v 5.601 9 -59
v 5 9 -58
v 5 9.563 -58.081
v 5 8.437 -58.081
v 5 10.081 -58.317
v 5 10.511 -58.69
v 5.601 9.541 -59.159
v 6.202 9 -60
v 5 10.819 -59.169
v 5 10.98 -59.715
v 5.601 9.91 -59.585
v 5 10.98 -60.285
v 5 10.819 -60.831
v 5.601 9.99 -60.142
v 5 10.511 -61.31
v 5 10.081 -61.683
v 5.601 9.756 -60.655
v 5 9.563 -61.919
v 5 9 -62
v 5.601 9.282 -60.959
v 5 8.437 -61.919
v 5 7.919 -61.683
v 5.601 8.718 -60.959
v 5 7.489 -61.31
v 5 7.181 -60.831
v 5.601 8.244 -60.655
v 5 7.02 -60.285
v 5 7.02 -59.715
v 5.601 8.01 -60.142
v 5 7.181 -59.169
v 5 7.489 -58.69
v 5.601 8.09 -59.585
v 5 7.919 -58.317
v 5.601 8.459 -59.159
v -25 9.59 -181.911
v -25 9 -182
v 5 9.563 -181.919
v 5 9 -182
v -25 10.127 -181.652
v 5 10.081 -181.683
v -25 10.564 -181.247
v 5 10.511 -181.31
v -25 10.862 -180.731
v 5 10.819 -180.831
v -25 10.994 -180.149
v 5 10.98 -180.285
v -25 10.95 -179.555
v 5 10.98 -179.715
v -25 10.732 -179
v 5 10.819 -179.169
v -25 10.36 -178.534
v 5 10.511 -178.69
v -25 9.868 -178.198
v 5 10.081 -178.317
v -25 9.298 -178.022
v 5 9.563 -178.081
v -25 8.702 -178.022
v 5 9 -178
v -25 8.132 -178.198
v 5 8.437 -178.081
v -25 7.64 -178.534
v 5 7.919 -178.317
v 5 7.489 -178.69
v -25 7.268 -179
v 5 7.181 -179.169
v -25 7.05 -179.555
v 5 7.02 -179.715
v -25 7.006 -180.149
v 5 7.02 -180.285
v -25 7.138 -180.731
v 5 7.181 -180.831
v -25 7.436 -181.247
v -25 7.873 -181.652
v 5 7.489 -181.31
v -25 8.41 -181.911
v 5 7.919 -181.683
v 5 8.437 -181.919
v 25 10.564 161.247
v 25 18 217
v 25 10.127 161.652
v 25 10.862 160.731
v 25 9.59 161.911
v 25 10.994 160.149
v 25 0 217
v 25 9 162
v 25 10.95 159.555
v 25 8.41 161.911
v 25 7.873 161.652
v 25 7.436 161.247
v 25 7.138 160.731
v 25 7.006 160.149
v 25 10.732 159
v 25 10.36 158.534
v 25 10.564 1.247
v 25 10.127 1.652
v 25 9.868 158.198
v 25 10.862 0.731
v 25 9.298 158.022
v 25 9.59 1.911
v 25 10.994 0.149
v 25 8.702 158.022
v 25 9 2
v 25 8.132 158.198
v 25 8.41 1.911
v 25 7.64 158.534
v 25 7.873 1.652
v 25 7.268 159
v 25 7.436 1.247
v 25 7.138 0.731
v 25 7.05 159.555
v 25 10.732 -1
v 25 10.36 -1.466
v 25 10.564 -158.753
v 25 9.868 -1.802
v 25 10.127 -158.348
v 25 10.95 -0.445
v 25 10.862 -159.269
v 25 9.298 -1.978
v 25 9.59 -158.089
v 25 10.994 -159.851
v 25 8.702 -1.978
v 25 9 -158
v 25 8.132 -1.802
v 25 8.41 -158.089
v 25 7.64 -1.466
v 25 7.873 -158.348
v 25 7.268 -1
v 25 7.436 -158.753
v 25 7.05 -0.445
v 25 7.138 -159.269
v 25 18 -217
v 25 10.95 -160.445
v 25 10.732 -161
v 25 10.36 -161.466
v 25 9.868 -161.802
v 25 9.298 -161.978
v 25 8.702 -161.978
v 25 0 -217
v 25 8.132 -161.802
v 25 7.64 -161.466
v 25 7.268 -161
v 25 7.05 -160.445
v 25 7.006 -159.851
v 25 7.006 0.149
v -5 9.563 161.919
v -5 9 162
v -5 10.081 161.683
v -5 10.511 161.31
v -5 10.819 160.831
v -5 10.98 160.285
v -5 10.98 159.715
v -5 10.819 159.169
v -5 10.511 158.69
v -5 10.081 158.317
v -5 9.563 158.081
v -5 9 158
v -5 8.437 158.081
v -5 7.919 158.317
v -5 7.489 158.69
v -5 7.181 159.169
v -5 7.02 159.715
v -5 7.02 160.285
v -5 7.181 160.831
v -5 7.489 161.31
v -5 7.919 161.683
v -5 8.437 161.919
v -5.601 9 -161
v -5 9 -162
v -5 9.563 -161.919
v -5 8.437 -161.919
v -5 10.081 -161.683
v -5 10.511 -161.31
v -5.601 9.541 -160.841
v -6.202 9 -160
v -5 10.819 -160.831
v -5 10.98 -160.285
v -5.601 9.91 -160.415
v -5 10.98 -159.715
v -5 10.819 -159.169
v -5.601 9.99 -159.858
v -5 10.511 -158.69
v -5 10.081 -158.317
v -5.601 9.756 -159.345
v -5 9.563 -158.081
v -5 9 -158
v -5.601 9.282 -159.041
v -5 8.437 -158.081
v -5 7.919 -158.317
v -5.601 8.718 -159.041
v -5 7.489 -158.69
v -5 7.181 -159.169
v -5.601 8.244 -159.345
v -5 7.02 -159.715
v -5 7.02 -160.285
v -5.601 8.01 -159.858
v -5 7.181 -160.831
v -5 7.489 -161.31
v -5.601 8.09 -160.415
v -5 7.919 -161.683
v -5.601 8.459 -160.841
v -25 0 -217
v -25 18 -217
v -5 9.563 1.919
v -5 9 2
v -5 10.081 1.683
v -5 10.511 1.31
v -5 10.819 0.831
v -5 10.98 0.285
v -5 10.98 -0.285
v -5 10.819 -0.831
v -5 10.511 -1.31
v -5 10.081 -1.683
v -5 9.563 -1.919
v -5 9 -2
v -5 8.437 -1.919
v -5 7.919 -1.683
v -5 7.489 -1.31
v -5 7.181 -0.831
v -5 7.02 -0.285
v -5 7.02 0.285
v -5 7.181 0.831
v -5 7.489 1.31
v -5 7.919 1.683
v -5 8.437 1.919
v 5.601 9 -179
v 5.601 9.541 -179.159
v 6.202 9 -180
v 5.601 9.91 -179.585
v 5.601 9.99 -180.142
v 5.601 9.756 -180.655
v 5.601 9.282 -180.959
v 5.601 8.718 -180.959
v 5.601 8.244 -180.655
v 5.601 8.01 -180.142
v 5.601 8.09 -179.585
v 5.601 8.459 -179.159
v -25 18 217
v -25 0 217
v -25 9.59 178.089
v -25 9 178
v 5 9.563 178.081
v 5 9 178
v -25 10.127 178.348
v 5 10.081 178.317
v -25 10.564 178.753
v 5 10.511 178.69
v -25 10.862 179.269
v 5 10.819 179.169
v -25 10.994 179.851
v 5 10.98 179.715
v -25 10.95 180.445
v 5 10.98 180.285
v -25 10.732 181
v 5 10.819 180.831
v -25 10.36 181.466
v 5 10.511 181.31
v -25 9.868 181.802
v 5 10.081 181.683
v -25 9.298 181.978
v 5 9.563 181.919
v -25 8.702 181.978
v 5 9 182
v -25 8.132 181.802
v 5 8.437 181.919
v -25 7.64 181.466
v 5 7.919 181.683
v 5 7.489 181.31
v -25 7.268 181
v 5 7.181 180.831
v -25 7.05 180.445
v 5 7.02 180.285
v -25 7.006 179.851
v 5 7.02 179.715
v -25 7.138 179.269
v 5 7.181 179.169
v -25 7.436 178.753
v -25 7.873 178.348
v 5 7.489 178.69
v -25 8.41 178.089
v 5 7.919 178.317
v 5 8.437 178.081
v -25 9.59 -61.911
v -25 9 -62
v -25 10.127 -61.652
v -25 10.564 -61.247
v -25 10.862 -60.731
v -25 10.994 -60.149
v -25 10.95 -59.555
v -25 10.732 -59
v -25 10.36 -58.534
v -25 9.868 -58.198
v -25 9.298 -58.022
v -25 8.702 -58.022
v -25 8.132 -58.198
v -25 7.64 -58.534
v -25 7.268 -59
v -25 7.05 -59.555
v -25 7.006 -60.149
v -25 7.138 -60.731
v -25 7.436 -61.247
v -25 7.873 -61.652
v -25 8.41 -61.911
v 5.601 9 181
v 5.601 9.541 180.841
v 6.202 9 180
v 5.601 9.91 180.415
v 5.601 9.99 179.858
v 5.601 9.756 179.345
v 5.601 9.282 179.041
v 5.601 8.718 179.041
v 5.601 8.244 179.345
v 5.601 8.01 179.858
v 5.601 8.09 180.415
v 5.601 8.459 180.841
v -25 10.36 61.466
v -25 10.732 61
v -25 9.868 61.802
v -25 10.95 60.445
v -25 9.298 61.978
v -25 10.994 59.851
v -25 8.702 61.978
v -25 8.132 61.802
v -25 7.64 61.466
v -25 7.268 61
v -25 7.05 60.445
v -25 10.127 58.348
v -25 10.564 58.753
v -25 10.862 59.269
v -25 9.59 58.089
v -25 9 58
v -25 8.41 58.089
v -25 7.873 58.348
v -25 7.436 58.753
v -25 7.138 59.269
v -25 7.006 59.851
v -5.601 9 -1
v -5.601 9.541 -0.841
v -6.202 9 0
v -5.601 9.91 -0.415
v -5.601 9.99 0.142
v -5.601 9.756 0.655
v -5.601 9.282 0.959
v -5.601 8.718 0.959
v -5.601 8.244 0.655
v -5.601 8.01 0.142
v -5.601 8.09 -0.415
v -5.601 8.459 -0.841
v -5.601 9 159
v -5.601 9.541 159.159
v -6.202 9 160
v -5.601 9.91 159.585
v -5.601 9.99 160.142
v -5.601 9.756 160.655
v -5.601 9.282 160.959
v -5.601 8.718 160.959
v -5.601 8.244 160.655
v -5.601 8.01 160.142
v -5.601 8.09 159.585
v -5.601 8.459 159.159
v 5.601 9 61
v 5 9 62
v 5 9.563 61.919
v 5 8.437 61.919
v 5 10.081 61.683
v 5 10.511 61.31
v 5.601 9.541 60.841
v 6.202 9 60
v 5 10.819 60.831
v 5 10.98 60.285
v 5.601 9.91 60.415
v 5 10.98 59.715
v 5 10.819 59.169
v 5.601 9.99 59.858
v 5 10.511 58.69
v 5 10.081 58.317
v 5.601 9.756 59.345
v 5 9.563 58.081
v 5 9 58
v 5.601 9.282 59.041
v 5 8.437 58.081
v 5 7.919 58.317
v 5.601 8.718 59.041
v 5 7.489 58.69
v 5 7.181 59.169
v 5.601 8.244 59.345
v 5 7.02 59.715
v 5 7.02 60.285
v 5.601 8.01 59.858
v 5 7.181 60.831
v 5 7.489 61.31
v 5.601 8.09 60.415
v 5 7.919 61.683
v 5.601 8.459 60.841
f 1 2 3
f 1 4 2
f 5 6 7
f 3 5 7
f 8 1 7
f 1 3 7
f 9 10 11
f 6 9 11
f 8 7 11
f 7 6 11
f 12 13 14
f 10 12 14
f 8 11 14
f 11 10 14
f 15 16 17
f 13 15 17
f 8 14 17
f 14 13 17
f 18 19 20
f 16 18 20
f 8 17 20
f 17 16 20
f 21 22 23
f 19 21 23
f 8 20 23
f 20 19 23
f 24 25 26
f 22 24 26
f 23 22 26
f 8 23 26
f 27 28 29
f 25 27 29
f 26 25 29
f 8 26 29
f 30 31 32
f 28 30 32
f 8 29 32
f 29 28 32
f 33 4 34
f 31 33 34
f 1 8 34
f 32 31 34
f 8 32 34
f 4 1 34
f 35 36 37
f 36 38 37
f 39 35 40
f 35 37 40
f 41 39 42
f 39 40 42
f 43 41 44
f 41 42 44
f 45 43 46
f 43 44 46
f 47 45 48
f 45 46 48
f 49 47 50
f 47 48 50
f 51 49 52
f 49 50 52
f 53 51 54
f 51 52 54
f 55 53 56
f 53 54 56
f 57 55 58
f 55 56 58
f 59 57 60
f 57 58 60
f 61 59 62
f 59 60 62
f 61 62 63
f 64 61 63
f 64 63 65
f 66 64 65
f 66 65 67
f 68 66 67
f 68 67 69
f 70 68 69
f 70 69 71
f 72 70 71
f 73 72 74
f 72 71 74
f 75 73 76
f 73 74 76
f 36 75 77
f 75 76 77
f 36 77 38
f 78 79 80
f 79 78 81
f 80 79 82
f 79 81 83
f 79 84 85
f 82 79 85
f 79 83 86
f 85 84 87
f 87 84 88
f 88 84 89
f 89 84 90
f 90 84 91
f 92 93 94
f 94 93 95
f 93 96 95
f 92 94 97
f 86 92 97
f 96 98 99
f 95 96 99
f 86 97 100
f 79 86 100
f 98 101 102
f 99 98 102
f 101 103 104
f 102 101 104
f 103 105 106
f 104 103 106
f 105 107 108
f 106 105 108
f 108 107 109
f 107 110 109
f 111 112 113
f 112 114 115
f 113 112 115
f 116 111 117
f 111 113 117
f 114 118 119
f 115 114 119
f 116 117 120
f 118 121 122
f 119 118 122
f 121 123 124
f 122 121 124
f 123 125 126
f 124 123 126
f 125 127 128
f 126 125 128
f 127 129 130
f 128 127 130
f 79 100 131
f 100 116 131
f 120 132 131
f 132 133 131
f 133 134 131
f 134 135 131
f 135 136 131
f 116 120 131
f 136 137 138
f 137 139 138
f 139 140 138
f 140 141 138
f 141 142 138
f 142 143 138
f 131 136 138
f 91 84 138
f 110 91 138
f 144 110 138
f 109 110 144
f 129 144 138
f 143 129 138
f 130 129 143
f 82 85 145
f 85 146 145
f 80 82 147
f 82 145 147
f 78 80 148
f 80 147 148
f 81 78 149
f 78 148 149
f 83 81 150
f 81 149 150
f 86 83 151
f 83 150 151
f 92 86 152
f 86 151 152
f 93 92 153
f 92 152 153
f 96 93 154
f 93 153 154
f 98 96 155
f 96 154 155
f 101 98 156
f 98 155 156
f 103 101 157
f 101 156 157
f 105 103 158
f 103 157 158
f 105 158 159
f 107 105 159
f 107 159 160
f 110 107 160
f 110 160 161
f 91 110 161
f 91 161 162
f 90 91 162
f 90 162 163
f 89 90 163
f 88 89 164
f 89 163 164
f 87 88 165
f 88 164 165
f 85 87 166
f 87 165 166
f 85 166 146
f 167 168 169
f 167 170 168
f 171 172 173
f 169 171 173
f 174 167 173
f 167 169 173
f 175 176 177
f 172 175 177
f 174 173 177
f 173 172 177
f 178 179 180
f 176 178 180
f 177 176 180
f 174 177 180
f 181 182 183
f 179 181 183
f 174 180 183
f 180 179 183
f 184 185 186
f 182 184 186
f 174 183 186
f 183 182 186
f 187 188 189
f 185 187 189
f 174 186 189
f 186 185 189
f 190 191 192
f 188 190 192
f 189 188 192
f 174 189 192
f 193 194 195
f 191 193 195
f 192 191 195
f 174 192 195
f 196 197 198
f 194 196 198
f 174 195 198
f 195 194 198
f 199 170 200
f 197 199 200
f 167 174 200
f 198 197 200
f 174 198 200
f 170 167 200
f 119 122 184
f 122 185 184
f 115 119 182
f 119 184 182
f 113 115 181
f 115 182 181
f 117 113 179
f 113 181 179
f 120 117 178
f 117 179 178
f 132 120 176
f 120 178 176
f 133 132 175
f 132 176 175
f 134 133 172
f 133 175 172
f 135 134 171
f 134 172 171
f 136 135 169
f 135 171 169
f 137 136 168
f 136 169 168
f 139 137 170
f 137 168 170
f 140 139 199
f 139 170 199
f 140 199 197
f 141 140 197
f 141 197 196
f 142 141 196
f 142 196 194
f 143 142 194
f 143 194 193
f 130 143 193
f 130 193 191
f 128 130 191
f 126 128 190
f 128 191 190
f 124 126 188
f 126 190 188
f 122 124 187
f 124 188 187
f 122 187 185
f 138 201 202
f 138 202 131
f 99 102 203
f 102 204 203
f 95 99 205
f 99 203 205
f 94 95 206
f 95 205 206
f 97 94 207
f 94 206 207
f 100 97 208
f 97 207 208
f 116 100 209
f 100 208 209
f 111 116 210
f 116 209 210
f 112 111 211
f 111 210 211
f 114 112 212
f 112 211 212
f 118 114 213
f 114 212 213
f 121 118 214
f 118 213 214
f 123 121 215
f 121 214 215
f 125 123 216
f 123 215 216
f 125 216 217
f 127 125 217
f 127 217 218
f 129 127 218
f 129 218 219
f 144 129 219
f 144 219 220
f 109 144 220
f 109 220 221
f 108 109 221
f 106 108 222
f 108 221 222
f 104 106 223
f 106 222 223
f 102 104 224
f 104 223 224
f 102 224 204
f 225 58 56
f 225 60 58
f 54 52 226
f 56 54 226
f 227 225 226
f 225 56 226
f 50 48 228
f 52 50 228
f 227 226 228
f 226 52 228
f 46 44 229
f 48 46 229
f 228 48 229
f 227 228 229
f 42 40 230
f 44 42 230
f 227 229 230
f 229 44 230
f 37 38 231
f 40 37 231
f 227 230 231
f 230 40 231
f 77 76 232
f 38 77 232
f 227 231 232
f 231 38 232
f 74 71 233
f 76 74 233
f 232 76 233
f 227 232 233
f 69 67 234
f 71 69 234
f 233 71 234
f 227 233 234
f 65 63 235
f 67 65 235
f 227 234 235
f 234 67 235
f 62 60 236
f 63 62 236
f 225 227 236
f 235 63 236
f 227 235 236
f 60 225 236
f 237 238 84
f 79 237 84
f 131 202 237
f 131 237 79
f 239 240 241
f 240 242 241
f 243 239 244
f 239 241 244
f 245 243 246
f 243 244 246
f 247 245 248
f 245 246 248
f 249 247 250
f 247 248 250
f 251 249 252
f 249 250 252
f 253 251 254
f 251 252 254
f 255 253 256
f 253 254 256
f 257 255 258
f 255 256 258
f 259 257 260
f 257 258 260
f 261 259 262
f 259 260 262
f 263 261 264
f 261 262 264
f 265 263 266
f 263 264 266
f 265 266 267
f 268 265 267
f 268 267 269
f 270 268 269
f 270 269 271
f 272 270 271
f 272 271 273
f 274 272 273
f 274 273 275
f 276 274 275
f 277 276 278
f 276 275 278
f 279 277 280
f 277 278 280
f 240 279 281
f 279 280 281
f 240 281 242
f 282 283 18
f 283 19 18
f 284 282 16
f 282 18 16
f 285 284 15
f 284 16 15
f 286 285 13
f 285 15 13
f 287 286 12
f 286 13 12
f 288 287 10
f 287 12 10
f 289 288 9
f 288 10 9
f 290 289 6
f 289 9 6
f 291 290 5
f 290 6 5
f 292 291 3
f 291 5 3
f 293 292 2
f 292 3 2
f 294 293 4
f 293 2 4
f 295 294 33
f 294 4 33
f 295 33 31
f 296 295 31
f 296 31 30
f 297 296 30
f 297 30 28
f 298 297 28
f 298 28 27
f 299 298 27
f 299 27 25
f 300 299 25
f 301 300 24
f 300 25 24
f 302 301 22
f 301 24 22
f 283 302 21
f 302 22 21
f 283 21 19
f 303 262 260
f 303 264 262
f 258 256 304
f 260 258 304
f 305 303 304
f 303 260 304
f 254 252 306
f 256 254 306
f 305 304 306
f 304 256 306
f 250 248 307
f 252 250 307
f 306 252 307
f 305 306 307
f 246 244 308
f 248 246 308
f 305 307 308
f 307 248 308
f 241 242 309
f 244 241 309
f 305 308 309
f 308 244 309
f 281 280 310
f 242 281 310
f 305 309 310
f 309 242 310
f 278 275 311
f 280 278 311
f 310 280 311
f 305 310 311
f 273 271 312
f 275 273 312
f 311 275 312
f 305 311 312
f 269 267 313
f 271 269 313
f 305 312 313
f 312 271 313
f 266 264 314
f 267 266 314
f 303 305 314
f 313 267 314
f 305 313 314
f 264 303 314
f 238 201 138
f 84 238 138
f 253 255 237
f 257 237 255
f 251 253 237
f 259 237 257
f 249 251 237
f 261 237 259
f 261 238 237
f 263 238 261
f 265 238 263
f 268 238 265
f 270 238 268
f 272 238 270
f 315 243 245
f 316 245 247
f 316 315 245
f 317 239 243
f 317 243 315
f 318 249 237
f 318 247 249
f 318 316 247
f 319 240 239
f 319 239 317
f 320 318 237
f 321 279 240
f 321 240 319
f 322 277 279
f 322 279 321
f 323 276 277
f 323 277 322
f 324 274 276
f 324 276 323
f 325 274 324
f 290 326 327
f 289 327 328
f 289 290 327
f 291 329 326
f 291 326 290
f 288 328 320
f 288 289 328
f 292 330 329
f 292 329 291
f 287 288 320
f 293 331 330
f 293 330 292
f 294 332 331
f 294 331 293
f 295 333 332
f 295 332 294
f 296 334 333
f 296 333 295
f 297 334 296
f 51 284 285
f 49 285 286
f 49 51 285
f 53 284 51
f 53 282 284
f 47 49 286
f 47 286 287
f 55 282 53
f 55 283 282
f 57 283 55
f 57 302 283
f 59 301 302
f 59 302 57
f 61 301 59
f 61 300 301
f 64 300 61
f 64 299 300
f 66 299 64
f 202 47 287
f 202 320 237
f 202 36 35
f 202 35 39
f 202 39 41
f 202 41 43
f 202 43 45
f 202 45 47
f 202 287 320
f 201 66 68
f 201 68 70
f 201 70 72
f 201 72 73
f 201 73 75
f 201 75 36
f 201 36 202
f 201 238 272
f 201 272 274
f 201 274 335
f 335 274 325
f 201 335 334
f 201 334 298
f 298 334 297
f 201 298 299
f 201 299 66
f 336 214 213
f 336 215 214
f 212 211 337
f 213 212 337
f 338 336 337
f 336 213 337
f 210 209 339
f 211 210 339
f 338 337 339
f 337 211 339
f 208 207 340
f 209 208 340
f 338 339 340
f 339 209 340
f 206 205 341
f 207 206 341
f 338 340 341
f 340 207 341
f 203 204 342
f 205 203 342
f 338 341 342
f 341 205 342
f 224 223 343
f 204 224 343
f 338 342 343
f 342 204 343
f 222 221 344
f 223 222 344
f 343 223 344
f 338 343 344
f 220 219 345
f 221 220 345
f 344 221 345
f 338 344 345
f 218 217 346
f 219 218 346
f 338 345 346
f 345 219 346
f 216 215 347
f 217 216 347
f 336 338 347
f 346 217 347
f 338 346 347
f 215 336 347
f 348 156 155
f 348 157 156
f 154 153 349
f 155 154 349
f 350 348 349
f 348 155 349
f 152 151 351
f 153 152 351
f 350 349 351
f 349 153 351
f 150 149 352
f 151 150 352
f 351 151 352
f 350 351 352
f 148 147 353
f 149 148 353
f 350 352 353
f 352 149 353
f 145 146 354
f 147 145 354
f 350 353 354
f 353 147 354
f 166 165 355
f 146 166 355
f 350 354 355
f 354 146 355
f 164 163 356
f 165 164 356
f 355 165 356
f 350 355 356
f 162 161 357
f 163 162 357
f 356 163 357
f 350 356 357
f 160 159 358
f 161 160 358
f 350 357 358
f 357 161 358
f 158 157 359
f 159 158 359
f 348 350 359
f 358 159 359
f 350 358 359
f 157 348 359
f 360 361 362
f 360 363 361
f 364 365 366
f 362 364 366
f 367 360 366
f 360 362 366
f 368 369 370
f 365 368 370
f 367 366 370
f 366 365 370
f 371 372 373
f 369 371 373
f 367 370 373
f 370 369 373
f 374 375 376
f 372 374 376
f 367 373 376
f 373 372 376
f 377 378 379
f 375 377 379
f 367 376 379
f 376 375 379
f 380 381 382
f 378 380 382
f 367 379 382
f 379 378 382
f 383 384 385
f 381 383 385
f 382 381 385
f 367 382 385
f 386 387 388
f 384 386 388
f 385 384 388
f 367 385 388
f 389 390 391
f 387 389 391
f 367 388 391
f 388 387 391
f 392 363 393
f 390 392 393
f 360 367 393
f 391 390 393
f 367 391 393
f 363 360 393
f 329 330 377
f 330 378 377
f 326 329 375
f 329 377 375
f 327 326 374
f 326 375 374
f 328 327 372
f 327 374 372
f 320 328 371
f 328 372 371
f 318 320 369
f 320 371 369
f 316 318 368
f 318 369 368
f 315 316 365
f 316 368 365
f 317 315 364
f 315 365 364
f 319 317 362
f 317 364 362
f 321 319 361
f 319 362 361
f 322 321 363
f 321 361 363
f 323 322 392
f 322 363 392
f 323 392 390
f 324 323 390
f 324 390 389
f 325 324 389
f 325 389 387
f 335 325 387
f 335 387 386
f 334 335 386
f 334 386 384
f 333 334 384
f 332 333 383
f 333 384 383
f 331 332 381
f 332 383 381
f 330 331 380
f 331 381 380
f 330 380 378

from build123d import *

# Parameters (mm, degrees)
SKETCH1_W                    = 50
SKETCH1_H                    = 434
BOSS_EXTRUDE1_DEPTH          = 18
F_4_0_4_DIAMETER_HOLE3_D     = 4
F_4_0_4_DIAMETER_HOLE3_DEPTH = 30
F_4_0_4_DIAMETER_HOLE3_TIP   = 1.201721238
F_4_0_4_DIAMETER_HOLE4_D     = 4
F_4_0_4_DIAMETER_HOLE4_DEPTH = 30
F_4_0_4_DIAMETER_HOLE4_TIP   = 1.201721238


with BuildPart() as part:
    # Sketch1 → Boss-Extrude1 (new body)
    with BuildSketch(Plane(origin=(0, 0, 0), x_dir=(1, 0, 0), z_dir=(0, 1, 0))):
        Rectangle(SKETCH1_W, SKETCH1_H)
    extrude(amount=BOSS_EXTRUDE1_DEPTH)

    # Ø4.0 (4) Diameter Hole3
    with Locations(Plane(origin=(25, 0, 0), x_dir=(0, 0, -1), z_dir=(1, 0, 0))):
        with Locations((160, 9), (0, 9), (-160, 9)):
            Hole(F_4_0_4_DIAMETER_HOLE3_D / 2, depth=F_4_0_4_DIAMETER_HOLE3_DEPTH)
            with Locations((0, 0, -(F_4_0_4_DIAMETER_HOLE3_DEPTH + F_4_0_4_DIAMETER_HOLE3_TIP / 2))):  # 118° drill point
                Cone(0, F_4_0_4_DIAMETER_HOLE3_D / 2, F_4_0_4_DIAMETER_HOLE3_TIP, mode=Mode.SUBTRACT)

    # Ø4.0 (4) Diameter Hole4
    with Locations(Plane.ZY.offset(25)):
        with Locations((180, 9), (60, 9), (-60, 9), (-180, 9)):
            Hole(F_4_0_4_DIAMETER_HOLE4_D / 2, depth=F_4_0_4_DIAMETER_HOLE4_DEPTH)
            with Locations((0, 0, -(F_4_0_4_DIAMETER_HOLE4_DEPTH + F_4_0_4_DIAMETER_HOLE4_TIP / 2))):  # 118° drill point
                Cone(0, F_4_0_4_DIAMETER_HOLE4_D / 2, F_4_0_4_DIAMETER_HOLE4_TIP, mode=Mode.SUBTRACT)


solid = part.part
